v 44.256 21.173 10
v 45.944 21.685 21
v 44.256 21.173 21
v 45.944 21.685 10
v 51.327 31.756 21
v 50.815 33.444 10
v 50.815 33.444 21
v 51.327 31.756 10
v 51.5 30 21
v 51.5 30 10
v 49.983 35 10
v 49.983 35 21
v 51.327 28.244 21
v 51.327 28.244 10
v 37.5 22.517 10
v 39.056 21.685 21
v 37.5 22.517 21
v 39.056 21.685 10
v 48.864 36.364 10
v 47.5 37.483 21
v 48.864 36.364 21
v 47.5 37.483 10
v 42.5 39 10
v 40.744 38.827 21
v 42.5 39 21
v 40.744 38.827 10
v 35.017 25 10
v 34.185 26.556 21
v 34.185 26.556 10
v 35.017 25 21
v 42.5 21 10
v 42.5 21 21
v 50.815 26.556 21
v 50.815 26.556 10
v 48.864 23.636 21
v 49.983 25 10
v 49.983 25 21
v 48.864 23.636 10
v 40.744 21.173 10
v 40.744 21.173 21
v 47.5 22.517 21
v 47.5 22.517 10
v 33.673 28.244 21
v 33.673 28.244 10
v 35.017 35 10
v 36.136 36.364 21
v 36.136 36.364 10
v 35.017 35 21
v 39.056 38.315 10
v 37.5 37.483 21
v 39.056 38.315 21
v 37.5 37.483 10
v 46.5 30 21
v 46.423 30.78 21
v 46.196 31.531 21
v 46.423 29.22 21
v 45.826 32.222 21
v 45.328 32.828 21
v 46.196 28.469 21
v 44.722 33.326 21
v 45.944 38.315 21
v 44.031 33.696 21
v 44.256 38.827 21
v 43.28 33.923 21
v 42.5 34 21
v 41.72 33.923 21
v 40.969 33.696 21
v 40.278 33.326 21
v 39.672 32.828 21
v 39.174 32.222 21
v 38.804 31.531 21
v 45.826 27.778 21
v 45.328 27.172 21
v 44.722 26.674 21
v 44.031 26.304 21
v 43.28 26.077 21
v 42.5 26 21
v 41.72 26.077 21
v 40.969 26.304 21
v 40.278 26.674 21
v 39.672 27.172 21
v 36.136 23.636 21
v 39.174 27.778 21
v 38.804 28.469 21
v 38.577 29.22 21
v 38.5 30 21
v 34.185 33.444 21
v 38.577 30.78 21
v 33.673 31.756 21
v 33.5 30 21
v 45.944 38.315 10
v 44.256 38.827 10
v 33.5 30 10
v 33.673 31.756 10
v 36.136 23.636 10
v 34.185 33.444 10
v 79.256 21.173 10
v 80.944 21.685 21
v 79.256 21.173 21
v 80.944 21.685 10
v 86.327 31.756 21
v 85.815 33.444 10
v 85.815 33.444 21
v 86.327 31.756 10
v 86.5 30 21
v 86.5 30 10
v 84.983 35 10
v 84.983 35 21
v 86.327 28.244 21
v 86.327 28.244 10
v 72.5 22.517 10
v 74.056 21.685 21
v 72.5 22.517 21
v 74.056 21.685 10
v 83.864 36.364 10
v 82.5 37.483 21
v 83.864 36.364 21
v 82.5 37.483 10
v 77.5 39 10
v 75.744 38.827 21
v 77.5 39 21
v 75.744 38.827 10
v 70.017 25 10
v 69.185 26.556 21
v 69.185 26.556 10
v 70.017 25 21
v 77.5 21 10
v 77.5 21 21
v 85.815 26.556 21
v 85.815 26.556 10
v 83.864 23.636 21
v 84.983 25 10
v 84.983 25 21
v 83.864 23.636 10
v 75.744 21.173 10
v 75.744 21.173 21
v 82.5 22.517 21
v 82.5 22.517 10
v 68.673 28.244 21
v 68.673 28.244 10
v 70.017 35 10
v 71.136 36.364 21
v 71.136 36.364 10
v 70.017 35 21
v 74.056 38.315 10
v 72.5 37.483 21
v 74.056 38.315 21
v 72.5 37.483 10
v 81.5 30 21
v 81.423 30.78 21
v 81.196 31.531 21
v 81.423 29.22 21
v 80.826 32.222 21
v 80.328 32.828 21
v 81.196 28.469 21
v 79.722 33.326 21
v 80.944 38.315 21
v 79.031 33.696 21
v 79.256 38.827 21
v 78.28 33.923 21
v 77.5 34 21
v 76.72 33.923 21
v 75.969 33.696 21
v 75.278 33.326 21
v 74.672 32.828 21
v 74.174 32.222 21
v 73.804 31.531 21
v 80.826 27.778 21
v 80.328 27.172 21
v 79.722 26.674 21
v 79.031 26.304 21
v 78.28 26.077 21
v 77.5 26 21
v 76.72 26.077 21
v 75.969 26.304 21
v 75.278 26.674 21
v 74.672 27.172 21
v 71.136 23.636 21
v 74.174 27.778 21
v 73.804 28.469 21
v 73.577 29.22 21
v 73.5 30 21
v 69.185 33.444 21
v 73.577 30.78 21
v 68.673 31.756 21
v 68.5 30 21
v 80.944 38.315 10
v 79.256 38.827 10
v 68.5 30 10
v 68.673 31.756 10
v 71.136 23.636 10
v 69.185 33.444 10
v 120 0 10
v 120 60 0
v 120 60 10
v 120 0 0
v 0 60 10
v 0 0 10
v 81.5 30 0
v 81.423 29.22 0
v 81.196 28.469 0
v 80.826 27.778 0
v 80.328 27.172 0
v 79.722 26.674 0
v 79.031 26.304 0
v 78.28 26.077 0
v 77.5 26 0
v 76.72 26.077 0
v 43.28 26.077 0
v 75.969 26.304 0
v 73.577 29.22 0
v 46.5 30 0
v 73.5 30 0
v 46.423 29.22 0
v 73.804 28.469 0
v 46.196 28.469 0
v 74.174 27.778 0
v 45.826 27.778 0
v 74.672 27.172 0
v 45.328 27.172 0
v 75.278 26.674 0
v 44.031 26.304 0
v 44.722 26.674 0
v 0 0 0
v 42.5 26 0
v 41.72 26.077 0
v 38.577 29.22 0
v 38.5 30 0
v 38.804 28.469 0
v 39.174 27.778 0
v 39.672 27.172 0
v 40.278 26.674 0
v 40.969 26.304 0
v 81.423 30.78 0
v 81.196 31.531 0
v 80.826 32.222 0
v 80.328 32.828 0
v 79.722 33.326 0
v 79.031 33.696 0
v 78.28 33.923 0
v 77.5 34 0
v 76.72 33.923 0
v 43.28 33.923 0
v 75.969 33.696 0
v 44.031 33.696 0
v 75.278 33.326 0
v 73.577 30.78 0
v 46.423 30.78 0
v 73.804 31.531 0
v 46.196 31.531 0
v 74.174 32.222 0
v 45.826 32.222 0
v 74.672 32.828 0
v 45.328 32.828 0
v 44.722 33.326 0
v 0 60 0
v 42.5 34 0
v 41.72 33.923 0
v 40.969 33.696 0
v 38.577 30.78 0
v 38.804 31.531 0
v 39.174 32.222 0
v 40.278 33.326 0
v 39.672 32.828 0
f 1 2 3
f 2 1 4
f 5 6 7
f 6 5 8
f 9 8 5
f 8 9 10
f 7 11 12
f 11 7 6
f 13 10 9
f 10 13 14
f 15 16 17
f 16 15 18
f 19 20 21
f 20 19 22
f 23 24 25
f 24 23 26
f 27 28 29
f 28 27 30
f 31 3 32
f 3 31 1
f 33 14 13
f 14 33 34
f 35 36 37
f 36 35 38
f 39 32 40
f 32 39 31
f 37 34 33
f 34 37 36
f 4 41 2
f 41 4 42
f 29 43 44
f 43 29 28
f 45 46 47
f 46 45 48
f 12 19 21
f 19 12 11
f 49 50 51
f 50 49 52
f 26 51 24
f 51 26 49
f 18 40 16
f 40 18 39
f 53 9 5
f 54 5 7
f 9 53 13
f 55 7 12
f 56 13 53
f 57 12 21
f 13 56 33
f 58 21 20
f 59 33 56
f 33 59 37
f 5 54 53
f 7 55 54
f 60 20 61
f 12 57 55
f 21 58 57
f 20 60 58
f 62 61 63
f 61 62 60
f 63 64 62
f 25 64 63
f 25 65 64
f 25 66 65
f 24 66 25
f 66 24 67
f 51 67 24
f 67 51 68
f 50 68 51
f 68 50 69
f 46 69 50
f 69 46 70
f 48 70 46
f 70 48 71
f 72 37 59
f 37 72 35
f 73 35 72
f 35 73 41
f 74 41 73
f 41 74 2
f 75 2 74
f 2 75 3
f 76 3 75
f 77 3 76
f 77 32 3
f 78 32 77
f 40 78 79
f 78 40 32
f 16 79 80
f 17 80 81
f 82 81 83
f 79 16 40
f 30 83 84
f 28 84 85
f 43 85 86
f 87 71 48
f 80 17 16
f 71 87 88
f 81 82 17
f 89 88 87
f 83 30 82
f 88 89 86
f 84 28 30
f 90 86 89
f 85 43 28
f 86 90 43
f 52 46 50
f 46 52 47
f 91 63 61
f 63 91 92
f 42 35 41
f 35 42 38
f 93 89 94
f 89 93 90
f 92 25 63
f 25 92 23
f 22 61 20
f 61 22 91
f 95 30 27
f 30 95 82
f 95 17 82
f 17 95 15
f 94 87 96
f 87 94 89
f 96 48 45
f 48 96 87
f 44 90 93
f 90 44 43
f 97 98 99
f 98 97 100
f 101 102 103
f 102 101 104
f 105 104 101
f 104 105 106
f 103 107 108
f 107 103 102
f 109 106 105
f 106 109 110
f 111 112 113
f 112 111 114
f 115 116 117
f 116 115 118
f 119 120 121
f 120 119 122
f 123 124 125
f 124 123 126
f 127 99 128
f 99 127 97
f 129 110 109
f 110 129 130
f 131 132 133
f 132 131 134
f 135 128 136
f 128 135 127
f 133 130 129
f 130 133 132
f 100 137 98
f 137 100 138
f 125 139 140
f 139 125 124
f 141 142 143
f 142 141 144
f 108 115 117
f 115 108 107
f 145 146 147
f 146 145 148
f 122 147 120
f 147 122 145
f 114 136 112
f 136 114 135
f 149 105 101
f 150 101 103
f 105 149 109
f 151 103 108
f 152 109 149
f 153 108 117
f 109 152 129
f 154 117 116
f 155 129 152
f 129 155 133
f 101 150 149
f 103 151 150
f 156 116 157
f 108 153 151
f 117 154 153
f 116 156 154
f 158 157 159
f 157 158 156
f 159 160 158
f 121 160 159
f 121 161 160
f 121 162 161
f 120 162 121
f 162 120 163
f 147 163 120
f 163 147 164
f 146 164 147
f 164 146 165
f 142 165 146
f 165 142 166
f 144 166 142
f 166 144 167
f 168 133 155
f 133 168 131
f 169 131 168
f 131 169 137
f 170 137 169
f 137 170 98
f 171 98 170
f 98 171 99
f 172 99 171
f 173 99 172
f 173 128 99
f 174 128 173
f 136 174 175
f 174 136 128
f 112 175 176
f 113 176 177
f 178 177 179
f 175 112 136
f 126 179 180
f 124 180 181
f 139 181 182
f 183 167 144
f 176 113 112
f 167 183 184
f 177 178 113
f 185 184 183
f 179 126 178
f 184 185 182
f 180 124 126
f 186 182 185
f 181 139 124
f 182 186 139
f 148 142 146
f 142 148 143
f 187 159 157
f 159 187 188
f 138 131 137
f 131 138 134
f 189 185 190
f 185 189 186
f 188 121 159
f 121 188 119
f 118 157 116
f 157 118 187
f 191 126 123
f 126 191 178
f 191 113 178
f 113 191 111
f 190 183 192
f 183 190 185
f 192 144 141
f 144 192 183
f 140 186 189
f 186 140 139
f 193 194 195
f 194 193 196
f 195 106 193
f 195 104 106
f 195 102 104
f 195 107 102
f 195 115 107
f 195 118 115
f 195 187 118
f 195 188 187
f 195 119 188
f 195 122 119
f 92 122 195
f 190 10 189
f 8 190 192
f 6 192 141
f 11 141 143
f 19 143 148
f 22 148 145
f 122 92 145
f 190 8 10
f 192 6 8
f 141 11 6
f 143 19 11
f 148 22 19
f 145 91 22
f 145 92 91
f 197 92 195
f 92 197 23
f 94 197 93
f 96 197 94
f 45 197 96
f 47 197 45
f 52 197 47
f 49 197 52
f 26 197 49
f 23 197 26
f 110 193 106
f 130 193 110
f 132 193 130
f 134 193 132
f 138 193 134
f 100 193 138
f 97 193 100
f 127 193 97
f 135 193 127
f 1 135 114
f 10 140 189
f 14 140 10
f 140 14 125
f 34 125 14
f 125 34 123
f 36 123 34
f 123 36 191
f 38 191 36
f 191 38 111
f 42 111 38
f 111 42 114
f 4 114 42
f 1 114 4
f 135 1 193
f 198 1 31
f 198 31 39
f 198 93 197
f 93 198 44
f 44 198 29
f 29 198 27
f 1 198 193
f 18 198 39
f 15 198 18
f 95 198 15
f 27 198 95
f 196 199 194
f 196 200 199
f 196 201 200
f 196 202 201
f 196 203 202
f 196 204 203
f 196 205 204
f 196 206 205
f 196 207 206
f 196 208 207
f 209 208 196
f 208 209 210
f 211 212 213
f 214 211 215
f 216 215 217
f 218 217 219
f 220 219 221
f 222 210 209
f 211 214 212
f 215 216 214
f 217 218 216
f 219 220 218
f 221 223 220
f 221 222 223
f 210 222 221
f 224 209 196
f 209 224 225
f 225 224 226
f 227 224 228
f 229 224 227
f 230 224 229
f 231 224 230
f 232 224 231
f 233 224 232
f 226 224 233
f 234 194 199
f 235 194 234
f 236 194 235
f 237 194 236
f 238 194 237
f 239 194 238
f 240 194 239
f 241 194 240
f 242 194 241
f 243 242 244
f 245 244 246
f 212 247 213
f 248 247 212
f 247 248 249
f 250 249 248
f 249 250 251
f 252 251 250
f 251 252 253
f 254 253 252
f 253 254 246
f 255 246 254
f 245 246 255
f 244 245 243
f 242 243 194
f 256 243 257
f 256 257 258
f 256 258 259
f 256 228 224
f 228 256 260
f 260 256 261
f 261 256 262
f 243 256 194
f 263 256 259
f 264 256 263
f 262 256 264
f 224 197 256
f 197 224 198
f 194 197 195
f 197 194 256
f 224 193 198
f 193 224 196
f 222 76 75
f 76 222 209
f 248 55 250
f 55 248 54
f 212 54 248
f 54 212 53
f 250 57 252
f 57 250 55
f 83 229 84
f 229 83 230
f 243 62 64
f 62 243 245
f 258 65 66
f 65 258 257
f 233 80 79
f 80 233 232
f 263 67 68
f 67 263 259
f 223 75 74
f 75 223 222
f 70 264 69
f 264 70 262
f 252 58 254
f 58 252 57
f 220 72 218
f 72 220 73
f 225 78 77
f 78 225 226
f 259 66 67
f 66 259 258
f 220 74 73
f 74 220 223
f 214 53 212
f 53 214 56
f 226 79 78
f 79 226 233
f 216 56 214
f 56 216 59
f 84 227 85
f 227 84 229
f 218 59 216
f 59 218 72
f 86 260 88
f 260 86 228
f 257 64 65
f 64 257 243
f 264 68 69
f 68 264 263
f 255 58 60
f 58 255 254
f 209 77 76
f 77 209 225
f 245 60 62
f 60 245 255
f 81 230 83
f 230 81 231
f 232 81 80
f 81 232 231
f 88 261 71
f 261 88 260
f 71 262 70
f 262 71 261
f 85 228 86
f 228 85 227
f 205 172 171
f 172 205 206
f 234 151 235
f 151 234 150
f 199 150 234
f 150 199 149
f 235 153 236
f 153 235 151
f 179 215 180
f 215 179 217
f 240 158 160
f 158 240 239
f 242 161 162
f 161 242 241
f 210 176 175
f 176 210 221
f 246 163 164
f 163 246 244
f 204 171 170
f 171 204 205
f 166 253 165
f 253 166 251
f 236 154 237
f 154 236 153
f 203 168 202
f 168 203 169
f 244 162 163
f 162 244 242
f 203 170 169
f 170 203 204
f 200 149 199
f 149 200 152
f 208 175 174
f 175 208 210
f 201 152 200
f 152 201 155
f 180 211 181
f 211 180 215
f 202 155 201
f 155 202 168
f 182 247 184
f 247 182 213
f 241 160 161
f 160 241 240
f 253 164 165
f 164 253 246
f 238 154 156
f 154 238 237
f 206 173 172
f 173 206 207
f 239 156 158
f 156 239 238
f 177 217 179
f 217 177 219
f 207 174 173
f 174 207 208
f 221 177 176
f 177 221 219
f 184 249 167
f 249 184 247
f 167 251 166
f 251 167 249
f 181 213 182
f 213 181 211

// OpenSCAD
$fn = 32;

// ----------------------------------------------------------------------
// Drill jig: two_boss jig
// ----------------------------------------------------------------------

// --- parameters (mm) ---
plate_l = 120;            // plate length, X
plate_w = 60;             // plate width, Y
plate_t = 10;             // plate thickness
boss_d = 18;              // guide boss diameter
boss_h = 12;              // boss height above the plate
guide_d = 8;              // guide hole diameter
boss_pitch = 35;          // boss pitch

n_boss = 2;  // guide bosses
boss_x0 = (plate_l - (n_boss - 1) * boss_pitch) / 2;  // first boss X
boss_top = plate_t - 1 + boss_h;  // boss crown height
total_h = boss_top;  // overall height

difference() {
  union() {
  cube([plate_l, plate_w, plate_t]);
  for (i = [0 : n_boss - 1])
    translate([boss_x0 + i * boss_pitch, plate_w / 2, plate_t - 1])
      cylinder(h = boss_h, d = boss_d);
  }
  for (i = [0 : n_boss - 1])
    translate([boss_x0 + i * boss_pitch, plate_w / 2, -1])
      cylinder(h = plate_t + boss_h, d = guide_d);
}
